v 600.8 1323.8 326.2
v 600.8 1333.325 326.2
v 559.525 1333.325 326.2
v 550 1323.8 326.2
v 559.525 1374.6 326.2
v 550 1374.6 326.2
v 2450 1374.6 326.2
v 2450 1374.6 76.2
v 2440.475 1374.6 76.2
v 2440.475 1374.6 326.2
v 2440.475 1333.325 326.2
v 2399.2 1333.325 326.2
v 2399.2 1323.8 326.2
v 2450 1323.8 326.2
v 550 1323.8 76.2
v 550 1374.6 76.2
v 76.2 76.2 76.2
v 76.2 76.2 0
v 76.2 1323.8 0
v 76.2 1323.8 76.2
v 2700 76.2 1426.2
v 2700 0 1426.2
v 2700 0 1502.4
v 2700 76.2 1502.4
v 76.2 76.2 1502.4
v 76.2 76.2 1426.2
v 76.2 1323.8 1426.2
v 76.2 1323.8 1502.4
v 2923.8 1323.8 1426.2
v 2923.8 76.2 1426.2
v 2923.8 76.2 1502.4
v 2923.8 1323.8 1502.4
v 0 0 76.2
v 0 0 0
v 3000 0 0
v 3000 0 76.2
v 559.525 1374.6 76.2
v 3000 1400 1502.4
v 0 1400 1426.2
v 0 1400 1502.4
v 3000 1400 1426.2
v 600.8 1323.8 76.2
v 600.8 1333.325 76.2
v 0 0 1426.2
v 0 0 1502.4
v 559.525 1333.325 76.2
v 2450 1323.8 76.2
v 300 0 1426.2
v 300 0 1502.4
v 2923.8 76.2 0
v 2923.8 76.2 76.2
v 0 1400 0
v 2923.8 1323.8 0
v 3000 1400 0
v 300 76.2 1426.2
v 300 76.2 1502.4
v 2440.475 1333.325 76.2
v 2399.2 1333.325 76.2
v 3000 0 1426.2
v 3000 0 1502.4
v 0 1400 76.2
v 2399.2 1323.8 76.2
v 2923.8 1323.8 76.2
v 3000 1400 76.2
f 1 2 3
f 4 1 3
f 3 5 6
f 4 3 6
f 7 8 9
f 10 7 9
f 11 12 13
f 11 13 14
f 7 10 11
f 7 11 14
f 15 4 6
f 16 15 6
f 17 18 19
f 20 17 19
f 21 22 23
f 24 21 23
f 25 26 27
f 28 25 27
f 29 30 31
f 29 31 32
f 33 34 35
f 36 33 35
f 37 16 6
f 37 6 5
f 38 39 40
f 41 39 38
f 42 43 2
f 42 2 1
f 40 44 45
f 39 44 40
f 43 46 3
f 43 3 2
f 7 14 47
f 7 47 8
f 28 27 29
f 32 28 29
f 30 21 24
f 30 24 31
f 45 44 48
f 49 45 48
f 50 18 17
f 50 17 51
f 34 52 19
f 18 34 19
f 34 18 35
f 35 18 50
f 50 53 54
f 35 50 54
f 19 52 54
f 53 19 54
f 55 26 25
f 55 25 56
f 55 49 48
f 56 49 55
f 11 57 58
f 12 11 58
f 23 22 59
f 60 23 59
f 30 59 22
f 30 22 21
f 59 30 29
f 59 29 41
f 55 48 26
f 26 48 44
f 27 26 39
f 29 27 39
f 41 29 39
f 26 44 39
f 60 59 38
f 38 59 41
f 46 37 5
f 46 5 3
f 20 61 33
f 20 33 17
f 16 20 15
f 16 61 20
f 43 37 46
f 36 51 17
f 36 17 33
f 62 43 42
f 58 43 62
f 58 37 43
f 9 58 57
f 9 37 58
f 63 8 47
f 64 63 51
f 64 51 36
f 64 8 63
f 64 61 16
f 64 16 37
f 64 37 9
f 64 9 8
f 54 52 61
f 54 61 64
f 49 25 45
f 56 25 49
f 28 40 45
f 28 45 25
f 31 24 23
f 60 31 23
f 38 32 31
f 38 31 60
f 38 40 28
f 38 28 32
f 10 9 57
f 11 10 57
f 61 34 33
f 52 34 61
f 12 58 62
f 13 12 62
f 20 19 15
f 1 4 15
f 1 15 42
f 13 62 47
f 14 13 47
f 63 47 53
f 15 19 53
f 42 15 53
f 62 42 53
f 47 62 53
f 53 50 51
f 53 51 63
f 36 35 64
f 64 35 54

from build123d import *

# Parameters (mm, degrees)
CROQUIS1_W              = 3000
CROQUIS1_H              = 1400
CROQUIS1_W_2            = 2847.6
CROQUIS1_H_2            = 1247.6
SALIENTE_EXTRUIR1_DEPTH = 76.2
CROQUIS2_W              = 76.2
CROQUIS2_H              = 76.2
SALIENTE_EXTRUIR2_DEPTH = 1350
CROQUIS3_W              = 3000
CROQUIS3_H              = 1400
CROQUIS3_W_2            = 2847.6
CROQUIS3_H_2            = 1247.6
SALIENTE_EXTRUIR3_DEPTH = 76.2
CROQUIS10_W             = 320
CROQUIS10_H             = 76.2
CORTAR_EXTRUIR2_DEPTH   = 76.2
CROQUIS11_W             = 76.2
CROQUIS11_H             = 1350
CORTAR_EXTRUIR3_DEPTH   = 76.2
CROQUIS13_W             = 2300
CROQUIS13_H             = 76.2
CORTAR_EXTRUIR5_DEPTH   = 80
SALIENTE_EXTRUIR4_DEPTH = 250
CROQUIS15_W             = 1350
CROQUIS15_H             = 76.2
CORTAR_EXTRUIR6_DEPTH   = 3000


with BuildPart() as part:
    # Croquis1 → Saliente-Extruir1 (new body)
    with BuildSketch(Plane.XY):
        with Locations((1500, 700)):
            Rectangle(CROQUIS1_W, CROQUIS1_H)
        with Locations((1500, 700)):
            Rectangle(CROQUIS1_W_2, CROQUIS1_H_2, mode=Mode.SUBTRACT)
    extrude(amount=SALIENTE_EXTRUIR1_DEPTH)

    # Croquis2 → Saliente-Extruir2 (add)
    with BuildSketch(Plane.XY.offset(76.2)):
        with Locations((38.1, 1361.9)):
            Rectangle(CROQUIS2_W, CROQUIS2_H)
        with Locations((2961.9, 1361.9)):
            Rectangle(CROQUIS2_W, CROQUIS2_H)
        with Locations((2961.9, 38.1)):
            Rectangle(CROQUIS2_W, CROQUIS2_H)
        with Locations((38.1, 38.1)):
            Rectangle(CROQUIS2_W, CROQUIS2_H)
    extrude(amount=SALIENTE_EXTRUIR2_DEPTH)

    # Croquis3 → Saliente-Extruir3 (add)
    with BuildSketch(Plane.XY.offset(1426.2)):
        with Locations((1500, 700)):
            Rectangle(CROQUIS3_W, CROQUIS3_H)
        with Locations((1500, 700)):
            Rectangle(CROQUIS3_W_2, CROQUIS3_H_2, mode=Mode.SUBTRACT)
    extrude(amount=SALIENTE_EXTRUIR3_DEPTH)

    # Croquis10 → Cortar-Extruir2 (cut)
    with BuildSketch(Plane.XY.offset(1502.4)):
        with Locations((460, 38.1)):
            Rectangle(CROQUIS10_W, CROQUIS10_H)
    extrude(amount=-CORTAR_EXTRUIR2_DEPTH, mode=Mode.SUBTRACT)

    # Croquis11 → Cortar-Extruir3 (cut)
    with BuildSketch(Plane(origin=(0, 1400, 0), x_dir=(1, 0, 0), z_dir=(0, 1, 0))):
        with Locations((2961.9, -751.2)):
            Rectangle(CROQUIS11_W, CROQUIS11_H)
        with Locations((38.1, -751.2)):
            Rectangle(CROQUIS11_W, CROQUIS11_H)
    extrude(amount=-CORTAR_EXTRUIR3_DEPTH, mode=Mode.SUBTRACT)

    # Croquis13 → Cortar-Extruir5 (cut)
    with BuildSketch(Plane.XZ):
        with Locations((1550, 1464.3)):
            Rectangle(CROQUIS13_W, CROQUIS13_H)
    extrude(amount=-CORTAR_EXTRUIR5_DEPTH, mode=Mode.SUBTRACT)

    # Croquis14 → Saliente-Extruir4 (add)
    with BuildSketch(Plane.XY.offset(76.2)):
        Polygon((550, 1323.8), (550, 1374.6), (559.525, 1374.6), (559.525, 1333.325), (600.8, 1333.325), (600.8, 1323.8), align=None)
        Polygon((2399.2, 1333.325), (2399.2, 1323.8), (2450, 1323.8), (2450, 1374.6), (2440.475, 1374.6), (2440.475, 1333.325), align=None)
    extrude(amount=SALIENTE_EXTRUIR4_DEPTH)

    # Croquis15 → Cortar-Extruir6 (cut)
    with BuildSketch(Plane.ZY):
        with Locations((751.2, 38.1)):
            Rectangle(CROQUIS15_W, CROQUIS15_H)
    extrude(amount=-CORTAR_EXTRUIR6_DEPTH, mode=Mode.SUBTRACT)


with BuildPart() as cortar_extruir6_piece_1:
    # of the separate pieces the step leaves, piece 1, a body of its own (cortar_extruir6_pieces)
    add(part.part.solids().sort_by_distance((0, 0, 0))[0])


with BuildPart() as cortar_extruir6_piece_2:
    # of the separate pieces the step leaves, piece 2, a body of its own (cortar_extruir6_pieces)
    add(part.part.solids().sort_by_distance((0, 1400, 1426.2))[0])


solid = Compound([cortar_extruir6_piece_1.part, cortar_extruir6_piece_2.part])
